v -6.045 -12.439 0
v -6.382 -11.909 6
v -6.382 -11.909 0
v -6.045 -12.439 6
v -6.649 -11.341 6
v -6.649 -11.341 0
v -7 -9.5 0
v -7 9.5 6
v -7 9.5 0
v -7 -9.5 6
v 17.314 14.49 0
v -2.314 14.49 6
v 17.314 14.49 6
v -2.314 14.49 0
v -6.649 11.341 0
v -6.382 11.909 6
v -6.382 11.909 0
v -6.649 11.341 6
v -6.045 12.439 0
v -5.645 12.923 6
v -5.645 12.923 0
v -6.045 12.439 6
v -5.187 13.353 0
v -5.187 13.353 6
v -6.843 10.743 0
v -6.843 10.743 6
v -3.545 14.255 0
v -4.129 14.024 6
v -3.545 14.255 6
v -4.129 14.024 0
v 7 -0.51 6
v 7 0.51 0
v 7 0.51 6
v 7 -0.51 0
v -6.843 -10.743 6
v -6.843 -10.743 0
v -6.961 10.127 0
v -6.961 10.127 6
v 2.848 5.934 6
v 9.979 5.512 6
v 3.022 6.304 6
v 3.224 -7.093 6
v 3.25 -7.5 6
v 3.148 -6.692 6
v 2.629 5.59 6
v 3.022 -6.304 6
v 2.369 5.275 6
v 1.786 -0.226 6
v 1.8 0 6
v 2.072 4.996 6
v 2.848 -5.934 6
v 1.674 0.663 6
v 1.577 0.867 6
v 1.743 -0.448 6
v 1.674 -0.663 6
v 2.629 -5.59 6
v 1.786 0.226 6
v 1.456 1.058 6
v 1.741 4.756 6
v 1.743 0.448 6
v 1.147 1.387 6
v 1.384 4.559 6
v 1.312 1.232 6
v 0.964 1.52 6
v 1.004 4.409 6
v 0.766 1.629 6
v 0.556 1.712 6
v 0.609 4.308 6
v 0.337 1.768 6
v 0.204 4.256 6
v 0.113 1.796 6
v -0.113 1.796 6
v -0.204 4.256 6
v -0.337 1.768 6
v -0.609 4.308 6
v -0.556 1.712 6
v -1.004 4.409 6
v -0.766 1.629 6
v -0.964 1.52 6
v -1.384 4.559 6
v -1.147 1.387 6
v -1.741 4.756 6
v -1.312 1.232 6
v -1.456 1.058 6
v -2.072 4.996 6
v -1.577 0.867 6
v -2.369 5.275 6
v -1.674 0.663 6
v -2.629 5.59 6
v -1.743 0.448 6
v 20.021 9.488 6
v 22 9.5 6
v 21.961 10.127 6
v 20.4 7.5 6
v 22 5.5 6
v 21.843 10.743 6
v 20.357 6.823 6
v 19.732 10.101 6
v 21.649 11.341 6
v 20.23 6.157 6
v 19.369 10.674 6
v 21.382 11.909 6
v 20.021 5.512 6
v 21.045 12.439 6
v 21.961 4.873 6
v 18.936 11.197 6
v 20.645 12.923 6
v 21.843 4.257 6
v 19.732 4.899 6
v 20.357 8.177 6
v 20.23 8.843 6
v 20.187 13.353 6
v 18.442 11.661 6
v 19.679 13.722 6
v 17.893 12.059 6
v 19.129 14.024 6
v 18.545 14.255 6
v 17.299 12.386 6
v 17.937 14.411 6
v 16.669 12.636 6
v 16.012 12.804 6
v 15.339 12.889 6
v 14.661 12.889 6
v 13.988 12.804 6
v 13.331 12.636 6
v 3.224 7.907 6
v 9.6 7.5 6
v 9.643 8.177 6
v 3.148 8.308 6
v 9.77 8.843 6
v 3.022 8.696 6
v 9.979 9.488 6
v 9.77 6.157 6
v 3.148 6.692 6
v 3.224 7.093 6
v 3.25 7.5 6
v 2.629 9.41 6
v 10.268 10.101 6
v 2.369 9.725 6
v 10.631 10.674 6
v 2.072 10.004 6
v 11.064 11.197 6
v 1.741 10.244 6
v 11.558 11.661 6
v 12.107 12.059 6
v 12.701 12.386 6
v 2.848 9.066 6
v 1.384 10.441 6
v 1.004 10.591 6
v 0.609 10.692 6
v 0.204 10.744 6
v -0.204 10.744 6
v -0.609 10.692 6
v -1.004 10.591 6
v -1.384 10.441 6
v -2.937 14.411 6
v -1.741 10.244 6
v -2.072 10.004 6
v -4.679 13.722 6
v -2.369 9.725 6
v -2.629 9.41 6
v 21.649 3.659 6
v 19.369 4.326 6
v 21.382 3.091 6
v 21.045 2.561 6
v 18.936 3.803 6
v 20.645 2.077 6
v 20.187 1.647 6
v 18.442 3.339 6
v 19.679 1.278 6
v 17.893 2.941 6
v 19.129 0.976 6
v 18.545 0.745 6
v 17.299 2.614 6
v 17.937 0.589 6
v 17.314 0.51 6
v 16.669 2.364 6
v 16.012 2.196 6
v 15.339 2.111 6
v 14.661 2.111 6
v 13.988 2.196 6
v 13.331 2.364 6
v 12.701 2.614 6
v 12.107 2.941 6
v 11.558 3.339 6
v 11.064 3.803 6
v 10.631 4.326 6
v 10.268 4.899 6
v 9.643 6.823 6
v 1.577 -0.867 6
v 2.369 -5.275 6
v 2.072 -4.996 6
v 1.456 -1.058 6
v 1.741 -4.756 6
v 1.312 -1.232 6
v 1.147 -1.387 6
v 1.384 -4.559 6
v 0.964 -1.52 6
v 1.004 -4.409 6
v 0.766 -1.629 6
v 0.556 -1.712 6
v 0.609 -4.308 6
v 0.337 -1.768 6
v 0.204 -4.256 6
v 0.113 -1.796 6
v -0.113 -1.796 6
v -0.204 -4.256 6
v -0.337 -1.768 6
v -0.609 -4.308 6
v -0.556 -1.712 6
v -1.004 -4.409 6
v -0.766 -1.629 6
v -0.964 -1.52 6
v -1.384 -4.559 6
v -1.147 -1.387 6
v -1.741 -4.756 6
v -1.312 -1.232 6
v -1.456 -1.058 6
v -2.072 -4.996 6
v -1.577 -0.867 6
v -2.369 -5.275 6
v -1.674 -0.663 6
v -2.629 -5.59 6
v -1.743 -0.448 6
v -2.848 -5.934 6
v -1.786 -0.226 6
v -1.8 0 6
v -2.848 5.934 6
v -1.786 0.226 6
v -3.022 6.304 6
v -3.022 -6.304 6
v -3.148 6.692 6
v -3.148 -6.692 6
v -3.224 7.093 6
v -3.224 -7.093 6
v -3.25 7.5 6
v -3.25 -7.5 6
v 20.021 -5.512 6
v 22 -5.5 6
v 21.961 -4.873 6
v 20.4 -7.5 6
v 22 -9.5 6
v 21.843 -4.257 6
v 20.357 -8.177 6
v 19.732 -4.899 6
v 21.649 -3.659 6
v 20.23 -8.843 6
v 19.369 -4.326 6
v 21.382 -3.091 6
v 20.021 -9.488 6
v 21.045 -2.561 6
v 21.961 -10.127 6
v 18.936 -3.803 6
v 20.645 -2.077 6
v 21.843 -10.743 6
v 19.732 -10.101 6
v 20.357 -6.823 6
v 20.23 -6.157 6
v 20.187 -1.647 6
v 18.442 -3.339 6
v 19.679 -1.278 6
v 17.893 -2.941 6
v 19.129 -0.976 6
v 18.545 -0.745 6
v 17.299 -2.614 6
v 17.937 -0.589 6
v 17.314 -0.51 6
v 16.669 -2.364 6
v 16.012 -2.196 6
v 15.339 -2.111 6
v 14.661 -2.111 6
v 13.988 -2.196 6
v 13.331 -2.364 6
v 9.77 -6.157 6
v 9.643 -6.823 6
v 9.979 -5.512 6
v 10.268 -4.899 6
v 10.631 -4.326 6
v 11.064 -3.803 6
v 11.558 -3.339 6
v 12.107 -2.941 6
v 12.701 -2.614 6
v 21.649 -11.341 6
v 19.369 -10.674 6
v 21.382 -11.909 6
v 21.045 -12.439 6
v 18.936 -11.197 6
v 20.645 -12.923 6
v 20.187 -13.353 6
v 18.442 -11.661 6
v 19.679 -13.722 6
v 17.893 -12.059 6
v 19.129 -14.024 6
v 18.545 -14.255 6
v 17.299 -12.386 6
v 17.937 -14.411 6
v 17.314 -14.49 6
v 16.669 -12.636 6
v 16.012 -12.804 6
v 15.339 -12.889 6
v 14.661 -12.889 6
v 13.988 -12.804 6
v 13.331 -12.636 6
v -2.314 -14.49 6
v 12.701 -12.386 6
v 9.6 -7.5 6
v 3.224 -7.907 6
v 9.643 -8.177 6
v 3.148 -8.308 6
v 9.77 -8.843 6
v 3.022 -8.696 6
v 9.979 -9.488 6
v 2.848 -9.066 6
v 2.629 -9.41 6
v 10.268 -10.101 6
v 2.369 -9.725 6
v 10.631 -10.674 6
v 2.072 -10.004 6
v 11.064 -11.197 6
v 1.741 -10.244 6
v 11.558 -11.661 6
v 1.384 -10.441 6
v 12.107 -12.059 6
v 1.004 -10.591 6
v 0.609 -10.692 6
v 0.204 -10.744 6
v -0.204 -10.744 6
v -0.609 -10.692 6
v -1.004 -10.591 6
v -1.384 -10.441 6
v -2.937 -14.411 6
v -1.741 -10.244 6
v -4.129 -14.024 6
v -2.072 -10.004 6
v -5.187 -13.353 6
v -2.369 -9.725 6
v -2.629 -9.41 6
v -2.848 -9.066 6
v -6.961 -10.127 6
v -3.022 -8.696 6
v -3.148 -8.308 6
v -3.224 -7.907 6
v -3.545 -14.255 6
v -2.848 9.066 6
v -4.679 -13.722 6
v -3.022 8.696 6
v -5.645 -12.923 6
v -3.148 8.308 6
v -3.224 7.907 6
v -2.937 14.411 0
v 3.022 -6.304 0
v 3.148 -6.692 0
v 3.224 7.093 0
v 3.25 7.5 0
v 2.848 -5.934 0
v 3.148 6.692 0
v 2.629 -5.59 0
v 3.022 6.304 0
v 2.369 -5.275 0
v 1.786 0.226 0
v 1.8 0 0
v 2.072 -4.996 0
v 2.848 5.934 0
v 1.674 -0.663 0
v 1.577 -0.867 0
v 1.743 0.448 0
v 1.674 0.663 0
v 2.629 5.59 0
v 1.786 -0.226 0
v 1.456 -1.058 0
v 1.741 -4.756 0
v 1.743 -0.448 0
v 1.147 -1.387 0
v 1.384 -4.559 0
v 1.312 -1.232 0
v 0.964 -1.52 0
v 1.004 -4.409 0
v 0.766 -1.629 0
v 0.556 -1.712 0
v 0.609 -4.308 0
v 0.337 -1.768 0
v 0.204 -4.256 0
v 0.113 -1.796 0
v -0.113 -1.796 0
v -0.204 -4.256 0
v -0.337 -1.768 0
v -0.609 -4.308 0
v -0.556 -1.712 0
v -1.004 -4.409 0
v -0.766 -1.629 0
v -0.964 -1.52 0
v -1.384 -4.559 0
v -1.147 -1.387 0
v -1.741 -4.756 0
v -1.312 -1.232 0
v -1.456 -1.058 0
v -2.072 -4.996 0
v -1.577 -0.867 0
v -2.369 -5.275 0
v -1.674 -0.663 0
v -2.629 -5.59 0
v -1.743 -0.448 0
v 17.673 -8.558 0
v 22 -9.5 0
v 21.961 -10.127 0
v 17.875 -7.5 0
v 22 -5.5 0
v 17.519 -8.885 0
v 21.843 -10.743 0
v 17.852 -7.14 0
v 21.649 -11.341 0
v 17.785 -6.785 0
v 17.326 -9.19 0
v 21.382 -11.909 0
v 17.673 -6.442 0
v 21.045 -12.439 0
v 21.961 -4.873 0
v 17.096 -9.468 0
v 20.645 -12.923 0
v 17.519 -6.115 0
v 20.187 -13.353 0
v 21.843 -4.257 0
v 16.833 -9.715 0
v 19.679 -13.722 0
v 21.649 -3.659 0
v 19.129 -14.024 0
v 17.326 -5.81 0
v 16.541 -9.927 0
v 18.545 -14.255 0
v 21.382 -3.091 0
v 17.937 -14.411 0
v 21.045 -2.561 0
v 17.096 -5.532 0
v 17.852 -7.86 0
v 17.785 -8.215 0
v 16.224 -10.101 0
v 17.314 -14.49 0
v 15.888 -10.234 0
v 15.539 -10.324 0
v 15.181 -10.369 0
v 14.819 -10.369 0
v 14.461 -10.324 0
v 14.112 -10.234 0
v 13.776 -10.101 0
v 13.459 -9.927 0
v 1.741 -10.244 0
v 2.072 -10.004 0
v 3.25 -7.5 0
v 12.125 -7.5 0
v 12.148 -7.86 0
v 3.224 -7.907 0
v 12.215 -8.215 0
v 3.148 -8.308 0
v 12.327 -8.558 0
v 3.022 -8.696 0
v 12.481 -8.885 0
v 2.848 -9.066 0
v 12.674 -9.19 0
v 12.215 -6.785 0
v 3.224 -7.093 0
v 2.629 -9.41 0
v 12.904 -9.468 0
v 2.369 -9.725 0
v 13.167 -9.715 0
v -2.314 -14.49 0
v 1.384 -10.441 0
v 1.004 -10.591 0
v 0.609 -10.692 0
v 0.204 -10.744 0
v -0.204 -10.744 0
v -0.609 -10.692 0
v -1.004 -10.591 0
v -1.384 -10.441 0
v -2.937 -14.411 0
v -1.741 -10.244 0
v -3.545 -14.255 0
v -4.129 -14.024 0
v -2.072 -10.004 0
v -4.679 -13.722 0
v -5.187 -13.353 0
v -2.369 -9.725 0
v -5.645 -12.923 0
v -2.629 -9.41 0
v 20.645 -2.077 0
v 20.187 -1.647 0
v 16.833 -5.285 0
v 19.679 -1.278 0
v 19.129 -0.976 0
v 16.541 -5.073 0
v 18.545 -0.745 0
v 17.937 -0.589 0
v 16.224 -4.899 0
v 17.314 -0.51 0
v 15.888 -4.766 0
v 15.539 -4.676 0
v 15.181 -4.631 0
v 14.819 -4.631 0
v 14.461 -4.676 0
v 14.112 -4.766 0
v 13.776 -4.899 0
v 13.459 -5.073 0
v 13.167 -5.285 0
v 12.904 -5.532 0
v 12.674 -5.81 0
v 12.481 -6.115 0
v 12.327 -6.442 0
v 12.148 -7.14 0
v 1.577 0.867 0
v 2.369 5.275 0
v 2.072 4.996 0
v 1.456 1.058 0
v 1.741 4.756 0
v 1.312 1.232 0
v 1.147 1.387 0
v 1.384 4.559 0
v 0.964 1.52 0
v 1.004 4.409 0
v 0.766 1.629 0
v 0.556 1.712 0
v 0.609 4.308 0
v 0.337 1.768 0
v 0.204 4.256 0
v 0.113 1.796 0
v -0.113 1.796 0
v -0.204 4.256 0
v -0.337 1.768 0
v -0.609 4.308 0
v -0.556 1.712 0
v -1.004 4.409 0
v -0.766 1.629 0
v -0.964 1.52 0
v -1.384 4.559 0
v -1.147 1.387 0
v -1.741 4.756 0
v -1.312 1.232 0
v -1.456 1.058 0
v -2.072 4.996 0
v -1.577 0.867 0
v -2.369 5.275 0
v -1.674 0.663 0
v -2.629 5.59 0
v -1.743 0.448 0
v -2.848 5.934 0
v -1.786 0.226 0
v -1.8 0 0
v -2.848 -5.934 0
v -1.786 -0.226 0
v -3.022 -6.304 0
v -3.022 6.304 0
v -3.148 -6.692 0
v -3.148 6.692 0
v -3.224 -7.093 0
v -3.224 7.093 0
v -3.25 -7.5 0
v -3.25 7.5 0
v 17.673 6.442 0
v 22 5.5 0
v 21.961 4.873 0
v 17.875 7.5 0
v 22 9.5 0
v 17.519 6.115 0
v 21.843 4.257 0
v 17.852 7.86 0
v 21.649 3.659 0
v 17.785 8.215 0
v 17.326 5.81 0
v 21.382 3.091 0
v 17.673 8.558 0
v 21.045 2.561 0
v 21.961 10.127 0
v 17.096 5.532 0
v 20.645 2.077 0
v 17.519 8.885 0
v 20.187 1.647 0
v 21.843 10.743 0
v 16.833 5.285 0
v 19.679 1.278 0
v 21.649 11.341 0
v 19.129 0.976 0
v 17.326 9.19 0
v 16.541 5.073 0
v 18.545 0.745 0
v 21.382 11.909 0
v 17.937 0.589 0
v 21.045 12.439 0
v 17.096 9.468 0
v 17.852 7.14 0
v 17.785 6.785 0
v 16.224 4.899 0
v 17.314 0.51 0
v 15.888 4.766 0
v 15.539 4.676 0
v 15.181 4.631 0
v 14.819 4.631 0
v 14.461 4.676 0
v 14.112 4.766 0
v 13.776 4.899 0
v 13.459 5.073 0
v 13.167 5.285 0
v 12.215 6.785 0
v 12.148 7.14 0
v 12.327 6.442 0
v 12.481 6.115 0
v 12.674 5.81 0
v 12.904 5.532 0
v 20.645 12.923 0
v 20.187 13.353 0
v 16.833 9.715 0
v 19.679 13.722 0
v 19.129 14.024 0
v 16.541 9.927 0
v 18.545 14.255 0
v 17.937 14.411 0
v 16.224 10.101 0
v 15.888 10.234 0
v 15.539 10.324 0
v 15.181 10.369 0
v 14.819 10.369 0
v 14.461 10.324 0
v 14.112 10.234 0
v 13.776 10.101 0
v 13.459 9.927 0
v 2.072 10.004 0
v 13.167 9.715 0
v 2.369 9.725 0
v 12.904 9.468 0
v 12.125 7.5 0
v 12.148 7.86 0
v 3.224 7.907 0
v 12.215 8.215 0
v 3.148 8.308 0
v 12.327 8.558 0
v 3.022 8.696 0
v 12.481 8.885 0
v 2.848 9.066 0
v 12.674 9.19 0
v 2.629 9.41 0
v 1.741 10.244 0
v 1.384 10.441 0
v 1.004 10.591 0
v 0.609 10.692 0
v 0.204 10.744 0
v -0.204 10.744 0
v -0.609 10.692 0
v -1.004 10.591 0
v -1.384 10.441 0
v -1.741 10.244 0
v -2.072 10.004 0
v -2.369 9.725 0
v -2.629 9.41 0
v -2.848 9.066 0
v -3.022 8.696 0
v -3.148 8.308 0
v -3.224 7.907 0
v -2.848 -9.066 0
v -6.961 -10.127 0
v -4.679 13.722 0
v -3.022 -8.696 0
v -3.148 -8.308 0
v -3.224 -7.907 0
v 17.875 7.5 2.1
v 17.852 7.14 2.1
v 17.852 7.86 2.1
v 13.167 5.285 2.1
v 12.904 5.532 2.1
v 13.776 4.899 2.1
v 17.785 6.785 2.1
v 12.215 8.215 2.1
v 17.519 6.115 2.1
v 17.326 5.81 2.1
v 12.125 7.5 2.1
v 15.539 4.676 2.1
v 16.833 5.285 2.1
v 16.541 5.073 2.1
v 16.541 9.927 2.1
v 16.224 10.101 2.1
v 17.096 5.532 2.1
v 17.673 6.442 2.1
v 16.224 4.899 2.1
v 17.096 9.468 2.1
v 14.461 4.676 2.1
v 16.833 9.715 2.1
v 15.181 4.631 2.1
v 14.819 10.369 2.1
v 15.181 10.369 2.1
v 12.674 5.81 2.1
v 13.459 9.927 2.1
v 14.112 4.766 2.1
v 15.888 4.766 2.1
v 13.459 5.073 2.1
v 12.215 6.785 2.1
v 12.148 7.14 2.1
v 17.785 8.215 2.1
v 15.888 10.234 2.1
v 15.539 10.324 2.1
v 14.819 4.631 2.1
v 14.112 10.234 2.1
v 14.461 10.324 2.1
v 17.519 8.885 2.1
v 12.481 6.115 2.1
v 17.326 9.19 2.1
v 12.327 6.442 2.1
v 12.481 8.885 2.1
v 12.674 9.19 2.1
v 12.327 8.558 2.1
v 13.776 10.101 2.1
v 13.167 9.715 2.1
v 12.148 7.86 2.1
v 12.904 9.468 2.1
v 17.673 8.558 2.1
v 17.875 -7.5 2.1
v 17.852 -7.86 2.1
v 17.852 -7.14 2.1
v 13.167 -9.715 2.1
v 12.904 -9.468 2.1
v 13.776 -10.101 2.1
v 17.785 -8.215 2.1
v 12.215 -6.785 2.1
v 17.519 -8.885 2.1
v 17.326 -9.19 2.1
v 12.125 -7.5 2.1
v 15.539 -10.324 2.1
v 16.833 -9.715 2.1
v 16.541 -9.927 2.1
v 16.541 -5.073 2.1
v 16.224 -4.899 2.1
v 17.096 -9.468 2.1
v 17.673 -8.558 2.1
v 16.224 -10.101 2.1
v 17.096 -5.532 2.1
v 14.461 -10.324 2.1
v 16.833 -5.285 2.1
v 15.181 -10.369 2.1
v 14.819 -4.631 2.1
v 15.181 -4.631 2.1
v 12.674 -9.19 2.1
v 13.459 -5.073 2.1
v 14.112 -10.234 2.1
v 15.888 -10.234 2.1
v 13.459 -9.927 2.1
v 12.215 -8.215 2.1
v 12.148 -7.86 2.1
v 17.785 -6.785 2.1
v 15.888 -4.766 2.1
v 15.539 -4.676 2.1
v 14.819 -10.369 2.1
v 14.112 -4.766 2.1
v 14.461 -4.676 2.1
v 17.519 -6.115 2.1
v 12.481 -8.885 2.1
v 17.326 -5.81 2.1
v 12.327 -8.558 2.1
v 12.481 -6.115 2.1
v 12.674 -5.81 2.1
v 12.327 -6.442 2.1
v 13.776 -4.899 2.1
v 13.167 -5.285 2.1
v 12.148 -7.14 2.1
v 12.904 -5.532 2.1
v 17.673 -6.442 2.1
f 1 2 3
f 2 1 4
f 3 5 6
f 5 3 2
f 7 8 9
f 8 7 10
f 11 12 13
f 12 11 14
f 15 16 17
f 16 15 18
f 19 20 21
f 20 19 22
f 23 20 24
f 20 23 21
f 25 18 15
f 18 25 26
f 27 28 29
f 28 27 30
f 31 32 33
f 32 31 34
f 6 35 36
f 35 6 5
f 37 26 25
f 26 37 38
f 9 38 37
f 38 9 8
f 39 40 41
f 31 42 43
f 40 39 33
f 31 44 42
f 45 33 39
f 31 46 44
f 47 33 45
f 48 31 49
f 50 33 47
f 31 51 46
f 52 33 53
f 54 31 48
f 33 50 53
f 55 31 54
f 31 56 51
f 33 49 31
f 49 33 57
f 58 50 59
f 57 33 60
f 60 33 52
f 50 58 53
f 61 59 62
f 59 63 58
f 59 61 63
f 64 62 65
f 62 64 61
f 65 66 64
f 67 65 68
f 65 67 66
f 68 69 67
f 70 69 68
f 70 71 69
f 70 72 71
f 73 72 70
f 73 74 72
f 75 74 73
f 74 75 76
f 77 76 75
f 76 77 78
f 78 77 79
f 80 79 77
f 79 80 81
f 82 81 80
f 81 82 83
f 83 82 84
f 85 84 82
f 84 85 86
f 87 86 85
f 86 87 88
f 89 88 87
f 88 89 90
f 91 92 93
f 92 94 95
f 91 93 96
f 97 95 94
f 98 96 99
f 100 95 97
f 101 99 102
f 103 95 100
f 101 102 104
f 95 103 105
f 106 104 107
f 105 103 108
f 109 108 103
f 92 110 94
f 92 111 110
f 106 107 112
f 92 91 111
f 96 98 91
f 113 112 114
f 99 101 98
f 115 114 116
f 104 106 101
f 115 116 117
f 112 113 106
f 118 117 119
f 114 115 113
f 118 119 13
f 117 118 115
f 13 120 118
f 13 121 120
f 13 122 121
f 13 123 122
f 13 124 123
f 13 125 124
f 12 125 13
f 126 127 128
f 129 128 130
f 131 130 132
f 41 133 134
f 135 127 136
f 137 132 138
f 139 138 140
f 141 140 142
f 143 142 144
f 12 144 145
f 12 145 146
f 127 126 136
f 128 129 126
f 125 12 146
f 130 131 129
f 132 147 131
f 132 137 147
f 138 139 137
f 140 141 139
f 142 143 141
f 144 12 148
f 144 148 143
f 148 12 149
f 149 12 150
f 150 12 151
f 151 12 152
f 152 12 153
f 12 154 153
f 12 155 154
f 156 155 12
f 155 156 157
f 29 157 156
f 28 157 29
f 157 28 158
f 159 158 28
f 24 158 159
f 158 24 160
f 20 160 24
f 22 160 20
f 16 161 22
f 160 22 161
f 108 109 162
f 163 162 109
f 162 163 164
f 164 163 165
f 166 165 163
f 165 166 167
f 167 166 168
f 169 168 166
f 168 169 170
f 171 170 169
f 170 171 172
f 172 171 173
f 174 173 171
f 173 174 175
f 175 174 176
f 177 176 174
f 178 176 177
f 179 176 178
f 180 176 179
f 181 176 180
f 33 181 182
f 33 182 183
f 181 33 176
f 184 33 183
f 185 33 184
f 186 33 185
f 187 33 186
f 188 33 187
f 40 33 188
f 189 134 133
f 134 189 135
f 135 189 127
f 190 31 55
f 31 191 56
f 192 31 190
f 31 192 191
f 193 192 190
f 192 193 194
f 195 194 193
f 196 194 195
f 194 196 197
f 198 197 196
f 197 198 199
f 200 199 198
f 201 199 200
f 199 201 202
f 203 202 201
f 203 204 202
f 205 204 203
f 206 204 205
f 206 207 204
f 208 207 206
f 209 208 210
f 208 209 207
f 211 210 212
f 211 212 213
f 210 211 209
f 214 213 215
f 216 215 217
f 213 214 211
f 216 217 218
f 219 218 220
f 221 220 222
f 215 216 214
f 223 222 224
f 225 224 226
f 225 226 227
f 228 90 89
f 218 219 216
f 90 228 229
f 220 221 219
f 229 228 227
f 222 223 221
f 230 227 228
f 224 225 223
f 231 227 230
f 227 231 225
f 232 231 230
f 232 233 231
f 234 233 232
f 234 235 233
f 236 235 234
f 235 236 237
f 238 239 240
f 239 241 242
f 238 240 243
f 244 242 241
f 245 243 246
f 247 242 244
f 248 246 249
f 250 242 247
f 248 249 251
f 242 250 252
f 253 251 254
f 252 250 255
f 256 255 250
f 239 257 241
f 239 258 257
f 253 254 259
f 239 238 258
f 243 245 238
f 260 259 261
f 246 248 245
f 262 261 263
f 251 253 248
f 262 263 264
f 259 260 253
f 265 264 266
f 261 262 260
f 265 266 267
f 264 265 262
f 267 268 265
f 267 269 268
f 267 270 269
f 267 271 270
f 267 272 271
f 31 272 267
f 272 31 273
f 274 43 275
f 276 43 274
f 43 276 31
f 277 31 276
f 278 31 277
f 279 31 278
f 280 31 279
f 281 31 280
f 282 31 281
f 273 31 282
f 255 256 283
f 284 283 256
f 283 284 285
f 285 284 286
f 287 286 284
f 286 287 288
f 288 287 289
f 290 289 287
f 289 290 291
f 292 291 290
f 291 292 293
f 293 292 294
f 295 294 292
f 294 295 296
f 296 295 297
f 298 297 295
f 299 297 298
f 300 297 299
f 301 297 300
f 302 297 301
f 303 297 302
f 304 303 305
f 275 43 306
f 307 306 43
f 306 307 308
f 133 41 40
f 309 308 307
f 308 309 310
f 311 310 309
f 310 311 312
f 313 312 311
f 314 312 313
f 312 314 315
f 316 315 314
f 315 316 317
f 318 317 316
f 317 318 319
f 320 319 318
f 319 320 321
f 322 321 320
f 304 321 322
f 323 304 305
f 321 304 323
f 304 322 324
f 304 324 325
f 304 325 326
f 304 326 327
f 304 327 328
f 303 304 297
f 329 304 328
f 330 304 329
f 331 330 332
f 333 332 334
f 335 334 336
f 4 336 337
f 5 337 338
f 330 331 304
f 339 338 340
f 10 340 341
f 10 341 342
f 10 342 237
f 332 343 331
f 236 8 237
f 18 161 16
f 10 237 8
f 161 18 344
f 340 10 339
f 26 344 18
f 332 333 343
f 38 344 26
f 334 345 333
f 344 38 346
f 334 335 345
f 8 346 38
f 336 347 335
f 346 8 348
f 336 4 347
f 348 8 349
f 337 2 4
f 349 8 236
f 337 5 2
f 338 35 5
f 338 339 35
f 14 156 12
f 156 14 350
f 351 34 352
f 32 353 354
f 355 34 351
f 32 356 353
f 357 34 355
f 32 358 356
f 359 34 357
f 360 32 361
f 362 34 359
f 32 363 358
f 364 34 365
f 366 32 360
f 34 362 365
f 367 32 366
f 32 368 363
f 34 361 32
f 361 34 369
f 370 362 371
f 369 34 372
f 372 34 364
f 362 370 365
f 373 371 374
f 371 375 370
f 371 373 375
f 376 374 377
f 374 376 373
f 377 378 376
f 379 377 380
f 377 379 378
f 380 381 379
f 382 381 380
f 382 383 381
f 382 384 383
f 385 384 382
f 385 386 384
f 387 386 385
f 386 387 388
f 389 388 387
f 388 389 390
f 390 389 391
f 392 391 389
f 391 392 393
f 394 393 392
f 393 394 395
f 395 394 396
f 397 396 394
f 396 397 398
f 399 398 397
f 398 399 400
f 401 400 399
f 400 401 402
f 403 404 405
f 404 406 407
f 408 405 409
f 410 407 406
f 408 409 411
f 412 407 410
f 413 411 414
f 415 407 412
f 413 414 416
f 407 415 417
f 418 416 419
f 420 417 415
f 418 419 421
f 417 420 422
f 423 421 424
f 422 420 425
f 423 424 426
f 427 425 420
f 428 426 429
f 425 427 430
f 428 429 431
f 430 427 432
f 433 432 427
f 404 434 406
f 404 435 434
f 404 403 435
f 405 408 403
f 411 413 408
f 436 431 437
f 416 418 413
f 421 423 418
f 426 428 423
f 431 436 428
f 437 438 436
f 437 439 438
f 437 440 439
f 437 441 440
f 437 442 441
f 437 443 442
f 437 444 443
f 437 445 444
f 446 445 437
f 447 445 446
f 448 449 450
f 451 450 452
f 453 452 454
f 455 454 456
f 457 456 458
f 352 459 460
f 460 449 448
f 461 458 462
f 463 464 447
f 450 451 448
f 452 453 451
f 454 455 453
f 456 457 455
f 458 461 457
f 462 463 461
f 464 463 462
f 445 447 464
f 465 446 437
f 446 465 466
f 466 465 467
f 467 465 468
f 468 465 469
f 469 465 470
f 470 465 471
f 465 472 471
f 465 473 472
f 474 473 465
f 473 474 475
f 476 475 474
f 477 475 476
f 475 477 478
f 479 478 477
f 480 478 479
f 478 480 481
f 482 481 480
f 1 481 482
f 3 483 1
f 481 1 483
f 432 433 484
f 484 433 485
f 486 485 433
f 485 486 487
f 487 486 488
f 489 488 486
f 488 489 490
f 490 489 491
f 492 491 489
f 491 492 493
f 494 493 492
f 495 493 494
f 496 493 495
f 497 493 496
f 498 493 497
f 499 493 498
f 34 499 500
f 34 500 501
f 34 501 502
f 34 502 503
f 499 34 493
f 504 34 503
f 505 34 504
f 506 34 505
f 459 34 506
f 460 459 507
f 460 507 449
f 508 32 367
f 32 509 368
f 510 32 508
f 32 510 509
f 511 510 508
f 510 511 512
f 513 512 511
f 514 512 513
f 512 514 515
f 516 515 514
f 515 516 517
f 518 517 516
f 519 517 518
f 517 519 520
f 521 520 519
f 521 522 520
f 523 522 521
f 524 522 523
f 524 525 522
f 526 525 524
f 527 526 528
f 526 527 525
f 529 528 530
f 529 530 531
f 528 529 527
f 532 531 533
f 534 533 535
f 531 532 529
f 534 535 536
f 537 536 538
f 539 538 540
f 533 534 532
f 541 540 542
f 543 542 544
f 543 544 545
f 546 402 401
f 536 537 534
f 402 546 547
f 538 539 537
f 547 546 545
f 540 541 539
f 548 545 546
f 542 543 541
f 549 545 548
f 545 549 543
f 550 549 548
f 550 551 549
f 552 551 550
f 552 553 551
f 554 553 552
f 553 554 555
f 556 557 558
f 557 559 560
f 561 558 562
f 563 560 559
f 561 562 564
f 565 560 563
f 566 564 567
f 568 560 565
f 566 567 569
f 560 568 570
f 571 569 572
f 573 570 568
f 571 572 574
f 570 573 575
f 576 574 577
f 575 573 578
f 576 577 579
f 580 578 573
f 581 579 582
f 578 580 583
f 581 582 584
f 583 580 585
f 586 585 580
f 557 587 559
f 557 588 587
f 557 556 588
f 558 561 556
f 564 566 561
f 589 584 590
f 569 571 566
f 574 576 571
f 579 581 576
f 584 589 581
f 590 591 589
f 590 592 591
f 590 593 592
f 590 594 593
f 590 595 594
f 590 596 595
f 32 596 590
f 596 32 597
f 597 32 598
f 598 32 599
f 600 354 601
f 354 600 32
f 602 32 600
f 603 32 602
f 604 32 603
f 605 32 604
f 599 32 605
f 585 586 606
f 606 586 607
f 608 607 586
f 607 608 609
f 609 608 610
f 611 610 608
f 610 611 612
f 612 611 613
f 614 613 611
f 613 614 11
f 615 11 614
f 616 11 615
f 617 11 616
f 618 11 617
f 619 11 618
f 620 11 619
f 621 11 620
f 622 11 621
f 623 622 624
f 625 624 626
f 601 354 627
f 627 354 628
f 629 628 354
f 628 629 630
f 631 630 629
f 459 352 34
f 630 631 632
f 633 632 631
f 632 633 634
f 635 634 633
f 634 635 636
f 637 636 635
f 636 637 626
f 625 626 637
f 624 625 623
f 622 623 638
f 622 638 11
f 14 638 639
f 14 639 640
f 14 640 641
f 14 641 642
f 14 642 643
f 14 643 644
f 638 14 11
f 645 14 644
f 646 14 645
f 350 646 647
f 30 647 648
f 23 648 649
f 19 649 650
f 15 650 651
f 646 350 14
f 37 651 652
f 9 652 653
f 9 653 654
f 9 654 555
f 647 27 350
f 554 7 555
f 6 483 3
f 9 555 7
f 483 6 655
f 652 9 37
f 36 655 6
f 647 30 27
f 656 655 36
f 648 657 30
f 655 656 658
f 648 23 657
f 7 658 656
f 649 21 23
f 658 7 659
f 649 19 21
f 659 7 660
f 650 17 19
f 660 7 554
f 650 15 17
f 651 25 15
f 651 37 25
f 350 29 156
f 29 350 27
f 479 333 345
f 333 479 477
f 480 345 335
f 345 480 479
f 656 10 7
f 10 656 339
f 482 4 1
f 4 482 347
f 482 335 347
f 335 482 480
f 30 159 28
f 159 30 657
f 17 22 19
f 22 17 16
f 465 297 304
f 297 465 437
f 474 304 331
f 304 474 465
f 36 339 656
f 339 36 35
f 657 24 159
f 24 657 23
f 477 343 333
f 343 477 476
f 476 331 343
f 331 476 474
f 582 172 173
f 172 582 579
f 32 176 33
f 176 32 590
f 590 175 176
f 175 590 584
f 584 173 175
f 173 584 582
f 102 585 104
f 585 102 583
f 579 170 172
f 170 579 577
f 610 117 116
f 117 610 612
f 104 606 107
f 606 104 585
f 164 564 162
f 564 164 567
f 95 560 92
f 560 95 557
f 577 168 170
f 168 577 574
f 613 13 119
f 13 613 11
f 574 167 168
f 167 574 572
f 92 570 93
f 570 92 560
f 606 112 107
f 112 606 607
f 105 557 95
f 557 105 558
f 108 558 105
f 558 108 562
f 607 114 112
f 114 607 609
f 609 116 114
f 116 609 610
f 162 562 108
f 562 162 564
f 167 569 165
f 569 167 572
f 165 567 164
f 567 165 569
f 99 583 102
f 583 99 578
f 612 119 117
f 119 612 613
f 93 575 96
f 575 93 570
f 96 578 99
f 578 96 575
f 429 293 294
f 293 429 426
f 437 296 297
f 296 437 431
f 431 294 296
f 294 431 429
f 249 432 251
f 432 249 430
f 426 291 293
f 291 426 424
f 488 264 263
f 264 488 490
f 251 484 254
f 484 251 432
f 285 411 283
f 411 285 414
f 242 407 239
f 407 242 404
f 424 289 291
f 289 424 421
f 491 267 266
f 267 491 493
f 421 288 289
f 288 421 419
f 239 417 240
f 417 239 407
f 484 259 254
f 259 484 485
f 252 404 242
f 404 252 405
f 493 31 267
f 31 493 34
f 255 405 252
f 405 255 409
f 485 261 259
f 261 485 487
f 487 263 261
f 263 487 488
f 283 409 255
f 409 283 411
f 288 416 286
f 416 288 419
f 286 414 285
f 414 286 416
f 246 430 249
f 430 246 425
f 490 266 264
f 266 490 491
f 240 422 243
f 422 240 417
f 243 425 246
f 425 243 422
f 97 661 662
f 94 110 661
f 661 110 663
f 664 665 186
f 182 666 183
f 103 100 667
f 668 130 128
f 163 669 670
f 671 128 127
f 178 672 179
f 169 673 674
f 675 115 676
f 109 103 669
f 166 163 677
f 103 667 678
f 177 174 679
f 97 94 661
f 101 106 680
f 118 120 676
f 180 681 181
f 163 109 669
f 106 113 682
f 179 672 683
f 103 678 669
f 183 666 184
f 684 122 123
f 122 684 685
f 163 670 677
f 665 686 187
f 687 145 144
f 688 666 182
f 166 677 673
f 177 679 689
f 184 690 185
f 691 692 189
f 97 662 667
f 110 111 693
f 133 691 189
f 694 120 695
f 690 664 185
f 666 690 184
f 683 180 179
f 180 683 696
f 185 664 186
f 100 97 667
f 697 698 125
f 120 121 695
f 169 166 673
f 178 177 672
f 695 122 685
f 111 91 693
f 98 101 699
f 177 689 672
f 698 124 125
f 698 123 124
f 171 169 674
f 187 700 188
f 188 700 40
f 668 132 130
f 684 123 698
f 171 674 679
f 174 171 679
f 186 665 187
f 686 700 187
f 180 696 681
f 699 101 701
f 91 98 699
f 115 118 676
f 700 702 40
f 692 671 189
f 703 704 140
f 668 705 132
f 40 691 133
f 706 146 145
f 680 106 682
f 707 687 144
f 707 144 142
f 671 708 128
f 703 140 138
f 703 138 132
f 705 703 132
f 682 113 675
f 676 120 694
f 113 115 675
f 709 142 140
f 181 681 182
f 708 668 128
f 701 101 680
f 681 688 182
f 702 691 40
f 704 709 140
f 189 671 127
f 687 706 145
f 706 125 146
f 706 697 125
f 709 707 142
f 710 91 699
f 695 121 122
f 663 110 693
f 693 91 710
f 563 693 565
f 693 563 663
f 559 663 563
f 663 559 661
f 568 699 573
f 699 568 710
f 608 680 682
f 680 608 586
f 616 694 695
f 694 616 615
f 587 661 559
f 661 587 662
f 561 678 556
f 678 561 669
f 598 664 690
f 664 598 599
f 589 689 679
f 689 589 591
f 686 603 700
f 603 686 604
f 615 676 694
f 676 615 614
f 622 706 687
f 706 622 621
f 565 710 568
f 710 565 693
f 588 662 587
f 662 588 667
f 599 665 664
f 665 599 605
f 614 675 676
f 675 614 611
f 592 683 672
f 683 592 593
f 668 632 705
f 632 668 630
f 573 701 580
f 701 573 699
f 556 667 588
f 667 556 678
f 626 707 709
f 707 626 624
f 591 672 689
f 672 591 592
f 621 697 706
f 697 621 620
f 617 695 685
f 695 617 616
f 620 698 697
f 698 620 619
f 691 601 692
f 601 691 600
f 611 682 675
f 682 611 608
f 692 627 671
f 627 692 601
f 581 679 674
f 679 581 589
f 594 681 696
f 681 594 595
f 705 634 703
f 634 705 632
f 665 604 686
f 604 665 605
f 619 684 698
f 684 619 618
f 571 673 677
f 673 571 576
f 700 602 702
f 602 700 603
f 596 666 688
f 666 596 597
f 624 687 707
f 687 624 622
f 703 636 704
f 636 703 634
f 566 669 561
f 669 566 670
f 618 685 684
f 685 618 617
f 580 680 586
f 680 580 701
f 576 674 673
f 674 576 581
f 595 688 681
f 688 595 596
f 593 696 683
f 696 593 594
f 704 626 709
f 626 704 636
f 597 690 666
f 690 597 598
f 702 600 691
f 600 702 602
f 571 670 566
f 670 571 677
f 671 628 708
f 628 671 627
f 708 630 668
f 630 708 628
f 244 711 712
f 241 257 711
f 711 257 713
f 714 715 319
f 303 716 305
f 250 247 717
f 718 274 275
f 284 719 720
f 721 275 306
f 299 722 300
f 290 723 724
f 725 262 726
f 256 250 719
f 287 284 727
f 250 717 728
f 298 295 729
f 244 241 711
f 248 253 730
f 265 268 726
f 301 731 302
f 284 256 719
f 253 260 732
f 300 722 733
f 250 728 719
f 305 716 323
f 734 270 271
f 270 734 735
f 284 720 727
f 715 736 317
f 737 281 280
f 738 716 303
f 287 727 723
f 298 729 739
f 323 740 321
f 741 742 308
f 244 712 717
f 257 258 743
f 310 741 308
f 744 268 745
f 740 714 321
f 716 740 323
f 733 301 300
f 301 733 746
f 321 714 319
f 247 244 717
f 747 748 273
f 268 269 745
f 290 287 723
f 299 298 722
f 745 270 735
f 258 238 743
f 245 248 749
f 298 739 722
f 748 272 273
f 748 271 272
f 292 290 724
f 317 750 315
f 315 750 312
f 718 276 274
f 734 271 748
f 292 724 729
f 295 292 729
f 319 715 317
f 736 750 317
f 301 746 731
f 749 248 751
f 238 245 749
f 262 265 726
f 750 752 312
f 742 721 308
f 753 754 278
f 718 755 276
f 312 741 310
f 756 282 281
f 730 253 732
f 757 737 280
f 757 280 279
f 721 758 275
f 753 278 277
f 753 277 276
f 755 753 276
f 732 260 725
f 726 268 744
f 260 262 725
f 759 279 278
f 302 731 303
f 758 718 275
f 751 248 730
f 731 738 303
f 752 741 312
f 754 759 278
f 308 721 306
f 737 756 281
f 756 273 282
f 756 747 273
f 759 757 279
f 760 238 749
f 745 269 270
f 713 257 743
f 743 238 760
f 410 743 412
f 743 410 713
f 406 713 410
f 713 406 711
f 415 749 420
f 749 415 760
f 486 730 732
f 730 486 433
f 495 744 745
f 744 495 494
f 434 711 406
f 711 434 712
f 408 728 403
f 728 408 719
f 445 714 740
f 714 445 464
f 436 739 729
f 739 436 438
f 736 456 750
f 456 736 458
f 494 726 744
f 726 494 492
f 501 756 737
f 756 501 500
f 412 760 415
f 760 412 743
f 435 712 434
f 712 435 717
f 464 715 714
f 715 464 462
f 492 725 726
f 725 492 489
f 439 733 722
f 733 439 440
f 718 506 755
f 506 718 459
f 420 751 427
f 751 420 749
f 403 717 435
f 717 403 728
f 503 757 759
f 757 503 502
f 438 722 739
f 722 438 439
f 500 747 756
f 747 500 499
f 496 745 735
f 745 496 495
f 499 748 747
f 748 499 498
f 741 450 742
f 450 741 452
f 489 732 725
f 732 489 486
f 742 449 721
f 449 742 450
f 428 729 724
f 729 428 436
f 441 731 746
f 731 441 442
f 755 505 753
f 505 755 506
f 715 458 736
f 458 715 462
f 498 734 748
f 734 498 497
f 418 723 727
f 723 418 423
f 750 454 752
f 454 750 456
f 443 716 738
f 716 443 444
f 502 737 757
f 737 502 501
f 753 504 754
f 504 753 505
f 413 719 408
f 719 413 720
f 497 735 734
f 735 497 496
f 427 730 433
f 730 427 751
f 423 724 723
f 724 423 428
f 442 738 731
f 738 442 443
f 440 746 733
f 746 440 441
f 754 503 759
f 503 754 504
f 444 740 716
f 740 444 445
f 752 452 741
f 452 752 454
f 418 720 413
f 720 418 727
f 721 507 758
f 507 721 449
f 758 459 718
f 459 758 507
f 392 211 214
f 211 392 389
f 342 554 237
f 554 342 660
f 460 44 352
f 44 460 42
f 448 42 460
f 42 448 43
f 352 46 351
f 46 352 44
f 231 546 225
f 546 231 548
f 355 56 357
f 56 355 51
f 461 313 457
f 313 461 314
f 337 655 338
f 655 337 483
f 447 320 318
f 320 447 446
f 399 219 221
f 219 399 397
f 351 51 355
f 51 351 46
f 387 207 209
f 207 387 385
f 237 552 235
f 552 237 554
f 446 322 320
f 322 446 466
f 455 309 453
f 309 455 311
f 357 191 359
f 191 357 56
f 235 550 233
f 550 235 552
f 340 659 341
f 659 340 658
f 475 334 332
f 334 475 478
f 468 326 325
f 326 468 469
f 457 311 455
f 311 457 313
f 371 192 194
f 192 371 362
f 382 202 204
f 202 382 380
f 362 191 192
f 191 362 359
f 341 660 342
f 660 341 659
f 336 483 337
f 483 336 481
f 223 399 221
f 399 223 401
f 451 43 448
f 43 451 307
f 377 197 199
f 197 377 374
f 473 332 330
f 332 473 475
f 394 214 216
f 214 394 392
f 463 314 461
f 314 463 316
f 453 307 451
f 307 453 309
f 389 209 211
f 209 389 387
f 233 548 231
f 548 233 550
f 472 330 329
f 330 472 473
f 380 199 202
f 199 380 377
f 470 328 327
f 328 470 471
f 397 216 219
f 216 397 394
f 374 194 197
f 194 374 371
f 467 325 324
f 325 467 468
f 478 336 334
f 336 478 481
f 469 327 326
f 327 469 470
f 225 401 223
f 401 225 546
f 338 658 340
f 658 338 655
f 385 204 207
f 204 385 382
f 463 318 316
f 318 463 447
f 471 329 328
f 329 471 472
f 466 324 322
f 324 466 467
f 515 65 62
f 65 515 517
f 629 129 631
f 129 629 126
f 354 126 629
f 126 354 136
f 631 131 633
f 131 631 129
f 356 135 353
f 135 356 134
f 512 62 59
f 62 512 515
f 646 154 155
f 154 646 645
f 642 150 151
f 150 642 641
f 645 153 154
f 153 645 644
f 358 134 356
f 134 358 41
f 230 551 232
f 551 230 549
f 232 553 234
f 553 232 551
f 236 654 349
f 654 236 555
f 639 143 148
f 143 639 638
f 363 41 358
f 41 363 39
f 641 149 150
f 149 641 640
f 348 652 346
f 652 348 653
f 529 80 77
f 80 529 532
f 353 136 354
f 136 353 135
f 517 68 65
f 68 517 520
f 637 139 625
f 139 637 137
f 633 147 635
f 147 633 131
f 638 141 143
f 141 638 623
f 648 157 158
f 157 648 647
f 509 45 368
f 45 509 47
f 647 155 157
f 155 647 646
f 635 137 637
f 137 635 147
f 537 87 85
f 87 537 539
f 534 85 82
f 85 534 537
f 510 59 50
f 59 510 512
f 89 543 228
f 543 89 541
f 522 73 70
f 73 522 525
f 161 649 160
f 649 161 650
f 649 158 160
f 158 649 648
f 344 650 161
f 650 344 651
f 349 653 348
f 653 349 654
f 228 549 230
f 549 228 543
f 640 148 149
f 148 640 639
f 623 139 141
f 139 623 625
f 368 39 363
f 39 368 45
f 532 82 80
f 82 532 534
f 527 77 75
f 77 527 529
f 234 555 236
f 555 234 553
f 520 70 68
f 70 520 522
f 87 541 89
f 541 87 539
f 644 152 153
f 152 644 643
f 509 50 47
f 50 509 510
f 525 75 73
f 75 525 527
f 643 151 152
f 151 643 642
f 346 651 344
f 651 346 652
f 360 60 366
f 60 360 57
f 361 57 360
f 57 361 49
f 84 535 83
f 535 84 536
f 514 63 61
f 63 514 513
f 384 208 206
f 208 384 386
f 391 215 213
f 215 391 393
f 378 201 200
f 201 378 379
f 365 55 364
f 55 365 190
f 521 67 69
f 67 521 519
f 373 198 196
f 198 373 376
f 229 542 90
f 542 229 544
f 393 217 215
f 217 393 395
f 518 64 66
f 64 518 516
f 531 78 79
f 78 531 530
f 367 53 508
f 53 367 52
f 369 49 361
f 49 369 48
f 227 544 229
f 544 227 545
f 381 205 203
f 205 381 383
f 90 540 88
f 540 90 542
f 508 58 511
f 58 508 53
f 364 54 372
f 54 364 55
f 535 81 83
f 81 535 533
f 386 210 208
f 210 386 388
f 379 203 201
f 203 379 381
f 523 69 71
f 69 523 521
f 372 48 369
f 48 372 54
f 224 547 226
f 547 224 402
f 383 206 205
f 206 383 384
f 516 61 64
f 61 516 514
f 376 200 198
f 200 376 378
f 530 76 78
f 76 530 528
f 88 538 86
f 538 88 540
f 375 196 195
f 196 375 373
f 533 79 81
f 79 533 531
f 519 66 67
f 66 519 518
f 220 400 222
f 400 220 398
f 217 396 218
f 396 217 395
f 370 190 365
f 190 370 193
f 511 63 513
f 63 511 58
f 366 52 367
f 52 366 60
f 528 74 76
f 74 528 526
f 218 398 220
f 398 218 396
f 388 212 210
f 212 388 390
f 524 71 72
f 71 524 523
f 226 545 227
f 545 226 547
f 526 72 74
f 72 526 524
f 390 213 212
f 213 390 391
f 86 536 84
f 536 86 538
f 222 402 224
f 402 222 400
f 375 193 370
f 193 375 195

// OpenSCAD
$fn = 50;


difference() {
	union() {
		hull() {
			translate(v = [-2.0000000000, 9.5000000000, 0]) {
				cylinder(h = 6, r = 5);
			}
			translate(v = [2.0000000000, 9.5000000000, 0]) {
				cylinder(h = 6, r = 5);
			}
			translate(v = [-2.0000000000, -9.5000000000, 0]) {
				cylinder(h = 6, r = 5);
			}
			translate(v = [2.0000000000, -9.5000000000, 0]) {
				cylinder(h = 6, r = 5);
			}
		}
		translate(v = [7.5000000000, 7.5000000000, 0]) {
			hull() {
				translate(v = [-9.5000000000, 2.0000000000, 0]) {
					cylinder(h = 6, r = 5);
				}
				translate(v = [9.5000000000, 2.0000000000, 0]) {
					cylinder(h = 6, r = 5);
				}
				translate(v = [-9.5000000000, -2.0000000000, 0]) {
					cylinder(h = 6, r = 5);
				}
				translate(v = [9.5000000000, -2.0000000000, 0]) {
					cylinder(h = 6, r = 5);
				}
			}
		}
		translate(v = [7.5000000000, -7.5000000000, 0]) {
			hull() {
				translate(v = [-9.5000000000, 2.0000000000, 0]) {
					cylinder(h = 6, r = 5);
				}
				translate(v = [9.5000000000, 2.0000000000, 0]) {
					cylinder(h = 6, r = 5);
				}
				translate(v = [-9.5000000000, -2.0000000000, 0]) {
					cylinder(h = 6, r = 5);
				}
				translate(v = [9.5000000000, -2.0000000000, 0]) {
					cylinder(h = 6, r = 5);
				}
			}
		}
	}
	union() {
		translate(v = [15.0000000000, 7.5000000000, 6]) {
			rotate(a = [0, 0, 0]) {
				difference() {
					union() {
						#translate(v = [0, 0, -6.0000000000]) {
							cylinder(h = 6, r = 2.6000000000);
						}
						#translate(v = [0, 0, -3.9000000000]) {
							cylinder(h = 3.9000000000, r1 = 2.8750000000, r2 = 5.4000000000);
						}
						#translate(v = [0, 0, -6.0000000000]) {
							cylinder(h = 6, r = 2.8750000000);
						}
						#translate(v = [0, 0, -6.0000000000]) {
							cylinder(h = 6, r = 2.6000000000);
						}
					}
					union();
				}
			}
		}
		translate(v = [15.0000000000, -7.5000000000, 6]) {
			rotate(a = [0, 0, 0]) {
				difference() {
					union() {
						#translate(v = [0, 0, -6.0000000000]) {
							cylinder(h = 6, r = 2.6000000000);
						}
						#translate(v = [0, 0, -3.9000000000]) {
							cylinder(h = 3.9000000000, r1 = 2.8750000000, r2 = 5.4000000000);
						}
						#translate(v = [0, 0, -6.0000000000]) {
							cylinder(h = 6, r = 2.8750000000);
						}
						#translate(v = [0, 0, -6.0000000000]) {
							cylinder(h = 6, r = 2.6000000000);
						}
					}
					union();
				}
			}
		}
		translate(v = [0.0000000000, -7.5000000000, 0]) {
			translate(v = [0, 0, -100]) {
				cylinder(h = 200, r = 3.2500000000);
			}
		}
		translate(v = [0.0000000000, 7.5000000000, 0]) {
			translate(v = [0, 0, -100]) {
				cylinder(h = 200, r = 3.2500000000);
			}
		}
		translate(v = [0.0000000000, -7.5000000000, 0]) {
			translate(v = [0, 0, -100]) {
				cylinder(h = 200, r = 1.8000000000);
			}
		}
		translate(v = [0, 0, -100]) {
			cylinder(h = 200, r = 1.8000000000);
		}
		translate(v = [0.0000000000, 7.5000000000, 0]) {
			translate(v = [0, 0, -100]) {
				cylinder(h = 200, r = 1.8000000000);
			}
		}
	}
}
